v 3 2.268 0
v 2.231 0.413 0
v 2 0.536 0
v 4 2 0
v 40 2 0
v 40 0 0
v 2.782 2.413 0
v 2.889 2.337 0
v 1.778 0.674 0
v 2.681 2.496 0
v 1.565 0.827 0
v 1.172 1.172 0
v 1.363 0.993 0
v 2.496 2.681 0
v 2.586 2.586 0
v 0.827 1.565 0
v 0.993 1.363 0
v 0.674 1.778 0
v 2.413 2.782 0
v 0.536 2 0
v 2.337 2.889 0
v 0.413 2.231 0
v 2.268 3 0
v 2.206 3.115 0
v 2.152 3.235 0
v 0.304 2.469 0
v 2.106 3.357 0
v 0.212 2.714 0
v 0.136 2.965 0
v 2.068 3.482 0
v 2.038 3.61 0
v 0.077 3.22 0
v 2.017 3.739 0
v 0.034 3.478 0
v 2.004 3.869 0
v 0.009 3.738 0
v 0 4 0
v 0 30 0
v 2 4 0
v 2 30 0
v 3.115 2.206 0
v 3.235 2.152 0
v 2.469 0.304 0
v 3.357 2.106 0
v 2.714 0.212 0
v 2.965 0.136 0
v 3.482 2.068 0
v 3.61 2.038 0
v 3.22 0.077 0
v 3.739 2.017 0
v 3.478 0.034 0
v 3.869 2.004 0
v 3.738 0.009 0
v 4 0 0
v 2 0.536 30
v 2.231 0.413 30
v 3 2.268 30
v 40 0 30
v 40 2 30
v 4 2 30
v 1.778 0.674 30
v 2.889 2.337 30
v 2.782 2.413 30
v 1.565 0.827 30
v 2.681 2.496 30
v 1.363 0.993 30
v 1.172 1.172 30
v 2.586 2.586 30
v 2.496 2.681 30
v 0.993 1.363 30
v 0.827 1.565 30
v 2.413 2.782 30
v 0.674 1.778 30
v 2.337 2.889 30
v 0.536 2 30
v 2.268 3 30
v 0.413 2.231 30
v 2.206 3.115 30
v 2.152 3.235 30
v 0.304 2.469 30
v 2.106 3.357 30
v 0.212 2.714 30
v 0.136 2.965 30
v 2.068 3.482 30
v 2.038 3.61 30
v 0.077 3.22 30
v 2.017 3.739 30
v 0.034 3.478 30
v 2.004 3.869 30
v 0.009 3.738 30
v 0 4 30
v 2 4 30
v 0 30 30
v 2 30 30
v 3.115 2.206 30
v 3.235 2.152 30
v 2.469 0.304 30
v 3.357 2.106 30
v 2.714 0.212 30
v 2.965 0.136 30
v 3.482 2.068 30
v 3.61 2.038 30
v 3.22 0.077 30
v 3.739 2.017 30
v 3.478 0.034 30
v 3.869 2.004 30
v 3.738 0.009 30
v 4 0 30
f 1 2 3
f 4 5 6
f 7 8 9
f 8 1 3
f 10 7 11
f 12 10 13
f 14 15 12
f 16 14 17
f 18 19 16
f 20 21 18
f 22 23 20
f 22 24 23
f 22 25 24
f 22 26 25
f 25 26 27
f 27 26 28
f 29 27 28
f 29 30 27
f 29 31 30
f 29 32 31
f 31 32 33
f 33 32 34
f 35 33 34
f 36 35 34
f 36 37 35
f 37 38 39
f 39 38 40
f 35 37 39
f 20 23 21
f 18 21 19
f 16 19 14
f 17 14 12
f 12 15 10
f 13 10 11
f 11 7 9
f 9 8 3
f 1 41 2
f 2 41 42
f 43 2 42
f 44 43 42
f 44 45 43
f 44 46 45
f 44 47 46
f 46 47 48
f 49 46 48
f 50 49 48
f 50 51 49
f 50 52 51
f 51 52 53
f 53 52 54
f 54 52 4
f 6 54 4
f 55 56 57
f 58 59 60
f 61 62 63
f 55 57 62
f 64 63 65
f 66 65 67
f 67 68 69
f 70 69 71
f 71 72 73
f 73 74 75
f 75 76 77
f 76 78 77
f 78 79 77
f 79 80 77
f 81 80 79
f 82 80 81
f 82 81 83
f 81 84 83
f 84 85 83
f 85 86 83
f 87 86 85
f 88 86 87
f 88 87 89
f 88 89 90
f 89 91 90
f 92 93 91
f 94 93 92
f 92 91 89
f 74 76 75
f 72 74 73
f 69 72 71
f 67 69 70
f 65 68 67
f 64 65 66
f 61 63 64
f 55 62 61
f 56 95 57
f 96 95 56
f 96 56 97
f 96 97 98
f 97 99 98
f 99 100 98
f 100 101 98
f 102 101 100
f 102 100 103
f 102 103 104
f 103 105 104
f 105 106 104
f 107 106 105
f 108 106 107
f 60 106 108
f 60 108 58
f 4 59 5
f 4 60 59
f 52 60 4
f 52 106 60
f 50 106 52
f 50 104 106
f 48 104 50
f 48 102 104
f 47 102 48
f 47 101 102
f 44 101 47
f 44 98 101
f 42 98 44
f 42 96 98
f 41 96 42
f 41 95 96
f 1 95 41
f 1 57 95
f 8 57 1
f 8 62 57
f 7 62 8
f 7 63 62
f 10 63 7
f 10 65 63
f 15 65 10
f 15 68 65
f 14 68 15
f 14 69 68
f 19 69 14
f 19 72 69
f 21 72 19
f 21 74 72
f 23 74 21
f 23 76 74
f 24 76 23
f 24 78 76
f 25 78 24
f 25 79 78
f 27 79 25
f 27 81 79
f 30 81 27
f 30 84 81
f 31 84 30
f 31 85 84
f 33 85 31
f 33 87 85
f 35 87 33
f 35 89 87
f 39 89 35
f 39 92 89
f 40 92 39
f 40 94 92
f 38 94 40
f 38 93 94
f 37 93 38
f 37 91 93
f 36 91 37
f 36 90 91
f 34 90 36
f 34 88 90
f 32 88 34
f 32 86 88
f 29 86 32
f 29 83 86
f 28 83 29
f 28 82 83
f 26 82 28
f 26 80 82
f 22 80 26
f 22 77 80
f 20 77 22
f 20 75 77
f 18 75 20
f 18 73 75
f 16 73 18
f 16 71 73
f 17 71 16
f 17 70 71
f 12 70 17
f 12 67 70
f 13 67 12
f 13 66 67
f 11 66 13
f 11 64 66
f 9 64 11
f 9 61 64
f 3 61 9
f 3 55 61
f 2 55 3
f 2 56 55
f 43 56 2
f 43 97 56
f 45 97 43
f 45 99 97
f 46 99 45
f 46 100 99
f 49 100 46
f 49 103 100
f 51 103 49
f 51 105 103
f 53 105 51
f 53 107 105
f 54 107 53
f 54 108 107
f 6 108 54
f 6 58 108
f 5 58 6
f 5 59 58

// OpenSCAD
$fn = 96;

thickness_mm = 2.0;
bend_radius_mm = 2.0;
flange_a_outside_mm = 40.0;
flange_b_outside_mm = 30.0;
bracket_width_mm = 30.0;
bend_angle_deg = 90.0;
k_factor = 0.45;

outside_radius_mm = bend_radius_mm + thickness_mm;
bend_allowance_mm = (bend_angle_deg * PI / 180) * (bend_radius_mm + k_factor * thickness_mm);
outside_setback_mm = (bend_radius_mm + thickness_mm) * tan(bend_angle_deg / 2);
flat_length_mm = flange_a_outside_mm + flange_b_outside_mm - 2 * outside_setback_mm + bend_allowance_mm;

echo(str(
    "MAKERBENCH-SHEETMETAL: {\"thickness_mm\": ",
    thickness_mm,
    ", \"bend_radius_mm\": ",
    bend_radius_mm,
    ", \"flat_length_mm\": ",
    flat_length_mm,
    "}"
));

function arc_points(center, radius, start_deg, end_deg, segments=24) =
    [for (i = [0:segments])
        let(a = start_deg + (end_deg - start_deg) * i / segments)
        [center[0] + radius * cos(a), center[1] + radius * sin(a)]
    ];

module bracket_profile_2d() {
    center = [outside_radius_mm, outside_radius_mm];

    points = concat(
        [[0, flange_b_outside_mm]],
        [[0, outside_radius_mm]],
        arc_points(center, outside_radius_mm, 180, 270, 24),
        [[flange_a_outside_mm, 0]],
        [[flange_a_outside_mm, thickness_mm]],
        [[outside_radius_mm, thickness_mm]],
        arc_points(center, bend_radius_mm, 270, 180, 24),
        [[thickness_mm, flange_b_outside_mm]]
    );

    polygon(points);
}

linear_extrude(height = bracket_width_mm, center = false, convexity = 10)
    bracket_profile_2d();
